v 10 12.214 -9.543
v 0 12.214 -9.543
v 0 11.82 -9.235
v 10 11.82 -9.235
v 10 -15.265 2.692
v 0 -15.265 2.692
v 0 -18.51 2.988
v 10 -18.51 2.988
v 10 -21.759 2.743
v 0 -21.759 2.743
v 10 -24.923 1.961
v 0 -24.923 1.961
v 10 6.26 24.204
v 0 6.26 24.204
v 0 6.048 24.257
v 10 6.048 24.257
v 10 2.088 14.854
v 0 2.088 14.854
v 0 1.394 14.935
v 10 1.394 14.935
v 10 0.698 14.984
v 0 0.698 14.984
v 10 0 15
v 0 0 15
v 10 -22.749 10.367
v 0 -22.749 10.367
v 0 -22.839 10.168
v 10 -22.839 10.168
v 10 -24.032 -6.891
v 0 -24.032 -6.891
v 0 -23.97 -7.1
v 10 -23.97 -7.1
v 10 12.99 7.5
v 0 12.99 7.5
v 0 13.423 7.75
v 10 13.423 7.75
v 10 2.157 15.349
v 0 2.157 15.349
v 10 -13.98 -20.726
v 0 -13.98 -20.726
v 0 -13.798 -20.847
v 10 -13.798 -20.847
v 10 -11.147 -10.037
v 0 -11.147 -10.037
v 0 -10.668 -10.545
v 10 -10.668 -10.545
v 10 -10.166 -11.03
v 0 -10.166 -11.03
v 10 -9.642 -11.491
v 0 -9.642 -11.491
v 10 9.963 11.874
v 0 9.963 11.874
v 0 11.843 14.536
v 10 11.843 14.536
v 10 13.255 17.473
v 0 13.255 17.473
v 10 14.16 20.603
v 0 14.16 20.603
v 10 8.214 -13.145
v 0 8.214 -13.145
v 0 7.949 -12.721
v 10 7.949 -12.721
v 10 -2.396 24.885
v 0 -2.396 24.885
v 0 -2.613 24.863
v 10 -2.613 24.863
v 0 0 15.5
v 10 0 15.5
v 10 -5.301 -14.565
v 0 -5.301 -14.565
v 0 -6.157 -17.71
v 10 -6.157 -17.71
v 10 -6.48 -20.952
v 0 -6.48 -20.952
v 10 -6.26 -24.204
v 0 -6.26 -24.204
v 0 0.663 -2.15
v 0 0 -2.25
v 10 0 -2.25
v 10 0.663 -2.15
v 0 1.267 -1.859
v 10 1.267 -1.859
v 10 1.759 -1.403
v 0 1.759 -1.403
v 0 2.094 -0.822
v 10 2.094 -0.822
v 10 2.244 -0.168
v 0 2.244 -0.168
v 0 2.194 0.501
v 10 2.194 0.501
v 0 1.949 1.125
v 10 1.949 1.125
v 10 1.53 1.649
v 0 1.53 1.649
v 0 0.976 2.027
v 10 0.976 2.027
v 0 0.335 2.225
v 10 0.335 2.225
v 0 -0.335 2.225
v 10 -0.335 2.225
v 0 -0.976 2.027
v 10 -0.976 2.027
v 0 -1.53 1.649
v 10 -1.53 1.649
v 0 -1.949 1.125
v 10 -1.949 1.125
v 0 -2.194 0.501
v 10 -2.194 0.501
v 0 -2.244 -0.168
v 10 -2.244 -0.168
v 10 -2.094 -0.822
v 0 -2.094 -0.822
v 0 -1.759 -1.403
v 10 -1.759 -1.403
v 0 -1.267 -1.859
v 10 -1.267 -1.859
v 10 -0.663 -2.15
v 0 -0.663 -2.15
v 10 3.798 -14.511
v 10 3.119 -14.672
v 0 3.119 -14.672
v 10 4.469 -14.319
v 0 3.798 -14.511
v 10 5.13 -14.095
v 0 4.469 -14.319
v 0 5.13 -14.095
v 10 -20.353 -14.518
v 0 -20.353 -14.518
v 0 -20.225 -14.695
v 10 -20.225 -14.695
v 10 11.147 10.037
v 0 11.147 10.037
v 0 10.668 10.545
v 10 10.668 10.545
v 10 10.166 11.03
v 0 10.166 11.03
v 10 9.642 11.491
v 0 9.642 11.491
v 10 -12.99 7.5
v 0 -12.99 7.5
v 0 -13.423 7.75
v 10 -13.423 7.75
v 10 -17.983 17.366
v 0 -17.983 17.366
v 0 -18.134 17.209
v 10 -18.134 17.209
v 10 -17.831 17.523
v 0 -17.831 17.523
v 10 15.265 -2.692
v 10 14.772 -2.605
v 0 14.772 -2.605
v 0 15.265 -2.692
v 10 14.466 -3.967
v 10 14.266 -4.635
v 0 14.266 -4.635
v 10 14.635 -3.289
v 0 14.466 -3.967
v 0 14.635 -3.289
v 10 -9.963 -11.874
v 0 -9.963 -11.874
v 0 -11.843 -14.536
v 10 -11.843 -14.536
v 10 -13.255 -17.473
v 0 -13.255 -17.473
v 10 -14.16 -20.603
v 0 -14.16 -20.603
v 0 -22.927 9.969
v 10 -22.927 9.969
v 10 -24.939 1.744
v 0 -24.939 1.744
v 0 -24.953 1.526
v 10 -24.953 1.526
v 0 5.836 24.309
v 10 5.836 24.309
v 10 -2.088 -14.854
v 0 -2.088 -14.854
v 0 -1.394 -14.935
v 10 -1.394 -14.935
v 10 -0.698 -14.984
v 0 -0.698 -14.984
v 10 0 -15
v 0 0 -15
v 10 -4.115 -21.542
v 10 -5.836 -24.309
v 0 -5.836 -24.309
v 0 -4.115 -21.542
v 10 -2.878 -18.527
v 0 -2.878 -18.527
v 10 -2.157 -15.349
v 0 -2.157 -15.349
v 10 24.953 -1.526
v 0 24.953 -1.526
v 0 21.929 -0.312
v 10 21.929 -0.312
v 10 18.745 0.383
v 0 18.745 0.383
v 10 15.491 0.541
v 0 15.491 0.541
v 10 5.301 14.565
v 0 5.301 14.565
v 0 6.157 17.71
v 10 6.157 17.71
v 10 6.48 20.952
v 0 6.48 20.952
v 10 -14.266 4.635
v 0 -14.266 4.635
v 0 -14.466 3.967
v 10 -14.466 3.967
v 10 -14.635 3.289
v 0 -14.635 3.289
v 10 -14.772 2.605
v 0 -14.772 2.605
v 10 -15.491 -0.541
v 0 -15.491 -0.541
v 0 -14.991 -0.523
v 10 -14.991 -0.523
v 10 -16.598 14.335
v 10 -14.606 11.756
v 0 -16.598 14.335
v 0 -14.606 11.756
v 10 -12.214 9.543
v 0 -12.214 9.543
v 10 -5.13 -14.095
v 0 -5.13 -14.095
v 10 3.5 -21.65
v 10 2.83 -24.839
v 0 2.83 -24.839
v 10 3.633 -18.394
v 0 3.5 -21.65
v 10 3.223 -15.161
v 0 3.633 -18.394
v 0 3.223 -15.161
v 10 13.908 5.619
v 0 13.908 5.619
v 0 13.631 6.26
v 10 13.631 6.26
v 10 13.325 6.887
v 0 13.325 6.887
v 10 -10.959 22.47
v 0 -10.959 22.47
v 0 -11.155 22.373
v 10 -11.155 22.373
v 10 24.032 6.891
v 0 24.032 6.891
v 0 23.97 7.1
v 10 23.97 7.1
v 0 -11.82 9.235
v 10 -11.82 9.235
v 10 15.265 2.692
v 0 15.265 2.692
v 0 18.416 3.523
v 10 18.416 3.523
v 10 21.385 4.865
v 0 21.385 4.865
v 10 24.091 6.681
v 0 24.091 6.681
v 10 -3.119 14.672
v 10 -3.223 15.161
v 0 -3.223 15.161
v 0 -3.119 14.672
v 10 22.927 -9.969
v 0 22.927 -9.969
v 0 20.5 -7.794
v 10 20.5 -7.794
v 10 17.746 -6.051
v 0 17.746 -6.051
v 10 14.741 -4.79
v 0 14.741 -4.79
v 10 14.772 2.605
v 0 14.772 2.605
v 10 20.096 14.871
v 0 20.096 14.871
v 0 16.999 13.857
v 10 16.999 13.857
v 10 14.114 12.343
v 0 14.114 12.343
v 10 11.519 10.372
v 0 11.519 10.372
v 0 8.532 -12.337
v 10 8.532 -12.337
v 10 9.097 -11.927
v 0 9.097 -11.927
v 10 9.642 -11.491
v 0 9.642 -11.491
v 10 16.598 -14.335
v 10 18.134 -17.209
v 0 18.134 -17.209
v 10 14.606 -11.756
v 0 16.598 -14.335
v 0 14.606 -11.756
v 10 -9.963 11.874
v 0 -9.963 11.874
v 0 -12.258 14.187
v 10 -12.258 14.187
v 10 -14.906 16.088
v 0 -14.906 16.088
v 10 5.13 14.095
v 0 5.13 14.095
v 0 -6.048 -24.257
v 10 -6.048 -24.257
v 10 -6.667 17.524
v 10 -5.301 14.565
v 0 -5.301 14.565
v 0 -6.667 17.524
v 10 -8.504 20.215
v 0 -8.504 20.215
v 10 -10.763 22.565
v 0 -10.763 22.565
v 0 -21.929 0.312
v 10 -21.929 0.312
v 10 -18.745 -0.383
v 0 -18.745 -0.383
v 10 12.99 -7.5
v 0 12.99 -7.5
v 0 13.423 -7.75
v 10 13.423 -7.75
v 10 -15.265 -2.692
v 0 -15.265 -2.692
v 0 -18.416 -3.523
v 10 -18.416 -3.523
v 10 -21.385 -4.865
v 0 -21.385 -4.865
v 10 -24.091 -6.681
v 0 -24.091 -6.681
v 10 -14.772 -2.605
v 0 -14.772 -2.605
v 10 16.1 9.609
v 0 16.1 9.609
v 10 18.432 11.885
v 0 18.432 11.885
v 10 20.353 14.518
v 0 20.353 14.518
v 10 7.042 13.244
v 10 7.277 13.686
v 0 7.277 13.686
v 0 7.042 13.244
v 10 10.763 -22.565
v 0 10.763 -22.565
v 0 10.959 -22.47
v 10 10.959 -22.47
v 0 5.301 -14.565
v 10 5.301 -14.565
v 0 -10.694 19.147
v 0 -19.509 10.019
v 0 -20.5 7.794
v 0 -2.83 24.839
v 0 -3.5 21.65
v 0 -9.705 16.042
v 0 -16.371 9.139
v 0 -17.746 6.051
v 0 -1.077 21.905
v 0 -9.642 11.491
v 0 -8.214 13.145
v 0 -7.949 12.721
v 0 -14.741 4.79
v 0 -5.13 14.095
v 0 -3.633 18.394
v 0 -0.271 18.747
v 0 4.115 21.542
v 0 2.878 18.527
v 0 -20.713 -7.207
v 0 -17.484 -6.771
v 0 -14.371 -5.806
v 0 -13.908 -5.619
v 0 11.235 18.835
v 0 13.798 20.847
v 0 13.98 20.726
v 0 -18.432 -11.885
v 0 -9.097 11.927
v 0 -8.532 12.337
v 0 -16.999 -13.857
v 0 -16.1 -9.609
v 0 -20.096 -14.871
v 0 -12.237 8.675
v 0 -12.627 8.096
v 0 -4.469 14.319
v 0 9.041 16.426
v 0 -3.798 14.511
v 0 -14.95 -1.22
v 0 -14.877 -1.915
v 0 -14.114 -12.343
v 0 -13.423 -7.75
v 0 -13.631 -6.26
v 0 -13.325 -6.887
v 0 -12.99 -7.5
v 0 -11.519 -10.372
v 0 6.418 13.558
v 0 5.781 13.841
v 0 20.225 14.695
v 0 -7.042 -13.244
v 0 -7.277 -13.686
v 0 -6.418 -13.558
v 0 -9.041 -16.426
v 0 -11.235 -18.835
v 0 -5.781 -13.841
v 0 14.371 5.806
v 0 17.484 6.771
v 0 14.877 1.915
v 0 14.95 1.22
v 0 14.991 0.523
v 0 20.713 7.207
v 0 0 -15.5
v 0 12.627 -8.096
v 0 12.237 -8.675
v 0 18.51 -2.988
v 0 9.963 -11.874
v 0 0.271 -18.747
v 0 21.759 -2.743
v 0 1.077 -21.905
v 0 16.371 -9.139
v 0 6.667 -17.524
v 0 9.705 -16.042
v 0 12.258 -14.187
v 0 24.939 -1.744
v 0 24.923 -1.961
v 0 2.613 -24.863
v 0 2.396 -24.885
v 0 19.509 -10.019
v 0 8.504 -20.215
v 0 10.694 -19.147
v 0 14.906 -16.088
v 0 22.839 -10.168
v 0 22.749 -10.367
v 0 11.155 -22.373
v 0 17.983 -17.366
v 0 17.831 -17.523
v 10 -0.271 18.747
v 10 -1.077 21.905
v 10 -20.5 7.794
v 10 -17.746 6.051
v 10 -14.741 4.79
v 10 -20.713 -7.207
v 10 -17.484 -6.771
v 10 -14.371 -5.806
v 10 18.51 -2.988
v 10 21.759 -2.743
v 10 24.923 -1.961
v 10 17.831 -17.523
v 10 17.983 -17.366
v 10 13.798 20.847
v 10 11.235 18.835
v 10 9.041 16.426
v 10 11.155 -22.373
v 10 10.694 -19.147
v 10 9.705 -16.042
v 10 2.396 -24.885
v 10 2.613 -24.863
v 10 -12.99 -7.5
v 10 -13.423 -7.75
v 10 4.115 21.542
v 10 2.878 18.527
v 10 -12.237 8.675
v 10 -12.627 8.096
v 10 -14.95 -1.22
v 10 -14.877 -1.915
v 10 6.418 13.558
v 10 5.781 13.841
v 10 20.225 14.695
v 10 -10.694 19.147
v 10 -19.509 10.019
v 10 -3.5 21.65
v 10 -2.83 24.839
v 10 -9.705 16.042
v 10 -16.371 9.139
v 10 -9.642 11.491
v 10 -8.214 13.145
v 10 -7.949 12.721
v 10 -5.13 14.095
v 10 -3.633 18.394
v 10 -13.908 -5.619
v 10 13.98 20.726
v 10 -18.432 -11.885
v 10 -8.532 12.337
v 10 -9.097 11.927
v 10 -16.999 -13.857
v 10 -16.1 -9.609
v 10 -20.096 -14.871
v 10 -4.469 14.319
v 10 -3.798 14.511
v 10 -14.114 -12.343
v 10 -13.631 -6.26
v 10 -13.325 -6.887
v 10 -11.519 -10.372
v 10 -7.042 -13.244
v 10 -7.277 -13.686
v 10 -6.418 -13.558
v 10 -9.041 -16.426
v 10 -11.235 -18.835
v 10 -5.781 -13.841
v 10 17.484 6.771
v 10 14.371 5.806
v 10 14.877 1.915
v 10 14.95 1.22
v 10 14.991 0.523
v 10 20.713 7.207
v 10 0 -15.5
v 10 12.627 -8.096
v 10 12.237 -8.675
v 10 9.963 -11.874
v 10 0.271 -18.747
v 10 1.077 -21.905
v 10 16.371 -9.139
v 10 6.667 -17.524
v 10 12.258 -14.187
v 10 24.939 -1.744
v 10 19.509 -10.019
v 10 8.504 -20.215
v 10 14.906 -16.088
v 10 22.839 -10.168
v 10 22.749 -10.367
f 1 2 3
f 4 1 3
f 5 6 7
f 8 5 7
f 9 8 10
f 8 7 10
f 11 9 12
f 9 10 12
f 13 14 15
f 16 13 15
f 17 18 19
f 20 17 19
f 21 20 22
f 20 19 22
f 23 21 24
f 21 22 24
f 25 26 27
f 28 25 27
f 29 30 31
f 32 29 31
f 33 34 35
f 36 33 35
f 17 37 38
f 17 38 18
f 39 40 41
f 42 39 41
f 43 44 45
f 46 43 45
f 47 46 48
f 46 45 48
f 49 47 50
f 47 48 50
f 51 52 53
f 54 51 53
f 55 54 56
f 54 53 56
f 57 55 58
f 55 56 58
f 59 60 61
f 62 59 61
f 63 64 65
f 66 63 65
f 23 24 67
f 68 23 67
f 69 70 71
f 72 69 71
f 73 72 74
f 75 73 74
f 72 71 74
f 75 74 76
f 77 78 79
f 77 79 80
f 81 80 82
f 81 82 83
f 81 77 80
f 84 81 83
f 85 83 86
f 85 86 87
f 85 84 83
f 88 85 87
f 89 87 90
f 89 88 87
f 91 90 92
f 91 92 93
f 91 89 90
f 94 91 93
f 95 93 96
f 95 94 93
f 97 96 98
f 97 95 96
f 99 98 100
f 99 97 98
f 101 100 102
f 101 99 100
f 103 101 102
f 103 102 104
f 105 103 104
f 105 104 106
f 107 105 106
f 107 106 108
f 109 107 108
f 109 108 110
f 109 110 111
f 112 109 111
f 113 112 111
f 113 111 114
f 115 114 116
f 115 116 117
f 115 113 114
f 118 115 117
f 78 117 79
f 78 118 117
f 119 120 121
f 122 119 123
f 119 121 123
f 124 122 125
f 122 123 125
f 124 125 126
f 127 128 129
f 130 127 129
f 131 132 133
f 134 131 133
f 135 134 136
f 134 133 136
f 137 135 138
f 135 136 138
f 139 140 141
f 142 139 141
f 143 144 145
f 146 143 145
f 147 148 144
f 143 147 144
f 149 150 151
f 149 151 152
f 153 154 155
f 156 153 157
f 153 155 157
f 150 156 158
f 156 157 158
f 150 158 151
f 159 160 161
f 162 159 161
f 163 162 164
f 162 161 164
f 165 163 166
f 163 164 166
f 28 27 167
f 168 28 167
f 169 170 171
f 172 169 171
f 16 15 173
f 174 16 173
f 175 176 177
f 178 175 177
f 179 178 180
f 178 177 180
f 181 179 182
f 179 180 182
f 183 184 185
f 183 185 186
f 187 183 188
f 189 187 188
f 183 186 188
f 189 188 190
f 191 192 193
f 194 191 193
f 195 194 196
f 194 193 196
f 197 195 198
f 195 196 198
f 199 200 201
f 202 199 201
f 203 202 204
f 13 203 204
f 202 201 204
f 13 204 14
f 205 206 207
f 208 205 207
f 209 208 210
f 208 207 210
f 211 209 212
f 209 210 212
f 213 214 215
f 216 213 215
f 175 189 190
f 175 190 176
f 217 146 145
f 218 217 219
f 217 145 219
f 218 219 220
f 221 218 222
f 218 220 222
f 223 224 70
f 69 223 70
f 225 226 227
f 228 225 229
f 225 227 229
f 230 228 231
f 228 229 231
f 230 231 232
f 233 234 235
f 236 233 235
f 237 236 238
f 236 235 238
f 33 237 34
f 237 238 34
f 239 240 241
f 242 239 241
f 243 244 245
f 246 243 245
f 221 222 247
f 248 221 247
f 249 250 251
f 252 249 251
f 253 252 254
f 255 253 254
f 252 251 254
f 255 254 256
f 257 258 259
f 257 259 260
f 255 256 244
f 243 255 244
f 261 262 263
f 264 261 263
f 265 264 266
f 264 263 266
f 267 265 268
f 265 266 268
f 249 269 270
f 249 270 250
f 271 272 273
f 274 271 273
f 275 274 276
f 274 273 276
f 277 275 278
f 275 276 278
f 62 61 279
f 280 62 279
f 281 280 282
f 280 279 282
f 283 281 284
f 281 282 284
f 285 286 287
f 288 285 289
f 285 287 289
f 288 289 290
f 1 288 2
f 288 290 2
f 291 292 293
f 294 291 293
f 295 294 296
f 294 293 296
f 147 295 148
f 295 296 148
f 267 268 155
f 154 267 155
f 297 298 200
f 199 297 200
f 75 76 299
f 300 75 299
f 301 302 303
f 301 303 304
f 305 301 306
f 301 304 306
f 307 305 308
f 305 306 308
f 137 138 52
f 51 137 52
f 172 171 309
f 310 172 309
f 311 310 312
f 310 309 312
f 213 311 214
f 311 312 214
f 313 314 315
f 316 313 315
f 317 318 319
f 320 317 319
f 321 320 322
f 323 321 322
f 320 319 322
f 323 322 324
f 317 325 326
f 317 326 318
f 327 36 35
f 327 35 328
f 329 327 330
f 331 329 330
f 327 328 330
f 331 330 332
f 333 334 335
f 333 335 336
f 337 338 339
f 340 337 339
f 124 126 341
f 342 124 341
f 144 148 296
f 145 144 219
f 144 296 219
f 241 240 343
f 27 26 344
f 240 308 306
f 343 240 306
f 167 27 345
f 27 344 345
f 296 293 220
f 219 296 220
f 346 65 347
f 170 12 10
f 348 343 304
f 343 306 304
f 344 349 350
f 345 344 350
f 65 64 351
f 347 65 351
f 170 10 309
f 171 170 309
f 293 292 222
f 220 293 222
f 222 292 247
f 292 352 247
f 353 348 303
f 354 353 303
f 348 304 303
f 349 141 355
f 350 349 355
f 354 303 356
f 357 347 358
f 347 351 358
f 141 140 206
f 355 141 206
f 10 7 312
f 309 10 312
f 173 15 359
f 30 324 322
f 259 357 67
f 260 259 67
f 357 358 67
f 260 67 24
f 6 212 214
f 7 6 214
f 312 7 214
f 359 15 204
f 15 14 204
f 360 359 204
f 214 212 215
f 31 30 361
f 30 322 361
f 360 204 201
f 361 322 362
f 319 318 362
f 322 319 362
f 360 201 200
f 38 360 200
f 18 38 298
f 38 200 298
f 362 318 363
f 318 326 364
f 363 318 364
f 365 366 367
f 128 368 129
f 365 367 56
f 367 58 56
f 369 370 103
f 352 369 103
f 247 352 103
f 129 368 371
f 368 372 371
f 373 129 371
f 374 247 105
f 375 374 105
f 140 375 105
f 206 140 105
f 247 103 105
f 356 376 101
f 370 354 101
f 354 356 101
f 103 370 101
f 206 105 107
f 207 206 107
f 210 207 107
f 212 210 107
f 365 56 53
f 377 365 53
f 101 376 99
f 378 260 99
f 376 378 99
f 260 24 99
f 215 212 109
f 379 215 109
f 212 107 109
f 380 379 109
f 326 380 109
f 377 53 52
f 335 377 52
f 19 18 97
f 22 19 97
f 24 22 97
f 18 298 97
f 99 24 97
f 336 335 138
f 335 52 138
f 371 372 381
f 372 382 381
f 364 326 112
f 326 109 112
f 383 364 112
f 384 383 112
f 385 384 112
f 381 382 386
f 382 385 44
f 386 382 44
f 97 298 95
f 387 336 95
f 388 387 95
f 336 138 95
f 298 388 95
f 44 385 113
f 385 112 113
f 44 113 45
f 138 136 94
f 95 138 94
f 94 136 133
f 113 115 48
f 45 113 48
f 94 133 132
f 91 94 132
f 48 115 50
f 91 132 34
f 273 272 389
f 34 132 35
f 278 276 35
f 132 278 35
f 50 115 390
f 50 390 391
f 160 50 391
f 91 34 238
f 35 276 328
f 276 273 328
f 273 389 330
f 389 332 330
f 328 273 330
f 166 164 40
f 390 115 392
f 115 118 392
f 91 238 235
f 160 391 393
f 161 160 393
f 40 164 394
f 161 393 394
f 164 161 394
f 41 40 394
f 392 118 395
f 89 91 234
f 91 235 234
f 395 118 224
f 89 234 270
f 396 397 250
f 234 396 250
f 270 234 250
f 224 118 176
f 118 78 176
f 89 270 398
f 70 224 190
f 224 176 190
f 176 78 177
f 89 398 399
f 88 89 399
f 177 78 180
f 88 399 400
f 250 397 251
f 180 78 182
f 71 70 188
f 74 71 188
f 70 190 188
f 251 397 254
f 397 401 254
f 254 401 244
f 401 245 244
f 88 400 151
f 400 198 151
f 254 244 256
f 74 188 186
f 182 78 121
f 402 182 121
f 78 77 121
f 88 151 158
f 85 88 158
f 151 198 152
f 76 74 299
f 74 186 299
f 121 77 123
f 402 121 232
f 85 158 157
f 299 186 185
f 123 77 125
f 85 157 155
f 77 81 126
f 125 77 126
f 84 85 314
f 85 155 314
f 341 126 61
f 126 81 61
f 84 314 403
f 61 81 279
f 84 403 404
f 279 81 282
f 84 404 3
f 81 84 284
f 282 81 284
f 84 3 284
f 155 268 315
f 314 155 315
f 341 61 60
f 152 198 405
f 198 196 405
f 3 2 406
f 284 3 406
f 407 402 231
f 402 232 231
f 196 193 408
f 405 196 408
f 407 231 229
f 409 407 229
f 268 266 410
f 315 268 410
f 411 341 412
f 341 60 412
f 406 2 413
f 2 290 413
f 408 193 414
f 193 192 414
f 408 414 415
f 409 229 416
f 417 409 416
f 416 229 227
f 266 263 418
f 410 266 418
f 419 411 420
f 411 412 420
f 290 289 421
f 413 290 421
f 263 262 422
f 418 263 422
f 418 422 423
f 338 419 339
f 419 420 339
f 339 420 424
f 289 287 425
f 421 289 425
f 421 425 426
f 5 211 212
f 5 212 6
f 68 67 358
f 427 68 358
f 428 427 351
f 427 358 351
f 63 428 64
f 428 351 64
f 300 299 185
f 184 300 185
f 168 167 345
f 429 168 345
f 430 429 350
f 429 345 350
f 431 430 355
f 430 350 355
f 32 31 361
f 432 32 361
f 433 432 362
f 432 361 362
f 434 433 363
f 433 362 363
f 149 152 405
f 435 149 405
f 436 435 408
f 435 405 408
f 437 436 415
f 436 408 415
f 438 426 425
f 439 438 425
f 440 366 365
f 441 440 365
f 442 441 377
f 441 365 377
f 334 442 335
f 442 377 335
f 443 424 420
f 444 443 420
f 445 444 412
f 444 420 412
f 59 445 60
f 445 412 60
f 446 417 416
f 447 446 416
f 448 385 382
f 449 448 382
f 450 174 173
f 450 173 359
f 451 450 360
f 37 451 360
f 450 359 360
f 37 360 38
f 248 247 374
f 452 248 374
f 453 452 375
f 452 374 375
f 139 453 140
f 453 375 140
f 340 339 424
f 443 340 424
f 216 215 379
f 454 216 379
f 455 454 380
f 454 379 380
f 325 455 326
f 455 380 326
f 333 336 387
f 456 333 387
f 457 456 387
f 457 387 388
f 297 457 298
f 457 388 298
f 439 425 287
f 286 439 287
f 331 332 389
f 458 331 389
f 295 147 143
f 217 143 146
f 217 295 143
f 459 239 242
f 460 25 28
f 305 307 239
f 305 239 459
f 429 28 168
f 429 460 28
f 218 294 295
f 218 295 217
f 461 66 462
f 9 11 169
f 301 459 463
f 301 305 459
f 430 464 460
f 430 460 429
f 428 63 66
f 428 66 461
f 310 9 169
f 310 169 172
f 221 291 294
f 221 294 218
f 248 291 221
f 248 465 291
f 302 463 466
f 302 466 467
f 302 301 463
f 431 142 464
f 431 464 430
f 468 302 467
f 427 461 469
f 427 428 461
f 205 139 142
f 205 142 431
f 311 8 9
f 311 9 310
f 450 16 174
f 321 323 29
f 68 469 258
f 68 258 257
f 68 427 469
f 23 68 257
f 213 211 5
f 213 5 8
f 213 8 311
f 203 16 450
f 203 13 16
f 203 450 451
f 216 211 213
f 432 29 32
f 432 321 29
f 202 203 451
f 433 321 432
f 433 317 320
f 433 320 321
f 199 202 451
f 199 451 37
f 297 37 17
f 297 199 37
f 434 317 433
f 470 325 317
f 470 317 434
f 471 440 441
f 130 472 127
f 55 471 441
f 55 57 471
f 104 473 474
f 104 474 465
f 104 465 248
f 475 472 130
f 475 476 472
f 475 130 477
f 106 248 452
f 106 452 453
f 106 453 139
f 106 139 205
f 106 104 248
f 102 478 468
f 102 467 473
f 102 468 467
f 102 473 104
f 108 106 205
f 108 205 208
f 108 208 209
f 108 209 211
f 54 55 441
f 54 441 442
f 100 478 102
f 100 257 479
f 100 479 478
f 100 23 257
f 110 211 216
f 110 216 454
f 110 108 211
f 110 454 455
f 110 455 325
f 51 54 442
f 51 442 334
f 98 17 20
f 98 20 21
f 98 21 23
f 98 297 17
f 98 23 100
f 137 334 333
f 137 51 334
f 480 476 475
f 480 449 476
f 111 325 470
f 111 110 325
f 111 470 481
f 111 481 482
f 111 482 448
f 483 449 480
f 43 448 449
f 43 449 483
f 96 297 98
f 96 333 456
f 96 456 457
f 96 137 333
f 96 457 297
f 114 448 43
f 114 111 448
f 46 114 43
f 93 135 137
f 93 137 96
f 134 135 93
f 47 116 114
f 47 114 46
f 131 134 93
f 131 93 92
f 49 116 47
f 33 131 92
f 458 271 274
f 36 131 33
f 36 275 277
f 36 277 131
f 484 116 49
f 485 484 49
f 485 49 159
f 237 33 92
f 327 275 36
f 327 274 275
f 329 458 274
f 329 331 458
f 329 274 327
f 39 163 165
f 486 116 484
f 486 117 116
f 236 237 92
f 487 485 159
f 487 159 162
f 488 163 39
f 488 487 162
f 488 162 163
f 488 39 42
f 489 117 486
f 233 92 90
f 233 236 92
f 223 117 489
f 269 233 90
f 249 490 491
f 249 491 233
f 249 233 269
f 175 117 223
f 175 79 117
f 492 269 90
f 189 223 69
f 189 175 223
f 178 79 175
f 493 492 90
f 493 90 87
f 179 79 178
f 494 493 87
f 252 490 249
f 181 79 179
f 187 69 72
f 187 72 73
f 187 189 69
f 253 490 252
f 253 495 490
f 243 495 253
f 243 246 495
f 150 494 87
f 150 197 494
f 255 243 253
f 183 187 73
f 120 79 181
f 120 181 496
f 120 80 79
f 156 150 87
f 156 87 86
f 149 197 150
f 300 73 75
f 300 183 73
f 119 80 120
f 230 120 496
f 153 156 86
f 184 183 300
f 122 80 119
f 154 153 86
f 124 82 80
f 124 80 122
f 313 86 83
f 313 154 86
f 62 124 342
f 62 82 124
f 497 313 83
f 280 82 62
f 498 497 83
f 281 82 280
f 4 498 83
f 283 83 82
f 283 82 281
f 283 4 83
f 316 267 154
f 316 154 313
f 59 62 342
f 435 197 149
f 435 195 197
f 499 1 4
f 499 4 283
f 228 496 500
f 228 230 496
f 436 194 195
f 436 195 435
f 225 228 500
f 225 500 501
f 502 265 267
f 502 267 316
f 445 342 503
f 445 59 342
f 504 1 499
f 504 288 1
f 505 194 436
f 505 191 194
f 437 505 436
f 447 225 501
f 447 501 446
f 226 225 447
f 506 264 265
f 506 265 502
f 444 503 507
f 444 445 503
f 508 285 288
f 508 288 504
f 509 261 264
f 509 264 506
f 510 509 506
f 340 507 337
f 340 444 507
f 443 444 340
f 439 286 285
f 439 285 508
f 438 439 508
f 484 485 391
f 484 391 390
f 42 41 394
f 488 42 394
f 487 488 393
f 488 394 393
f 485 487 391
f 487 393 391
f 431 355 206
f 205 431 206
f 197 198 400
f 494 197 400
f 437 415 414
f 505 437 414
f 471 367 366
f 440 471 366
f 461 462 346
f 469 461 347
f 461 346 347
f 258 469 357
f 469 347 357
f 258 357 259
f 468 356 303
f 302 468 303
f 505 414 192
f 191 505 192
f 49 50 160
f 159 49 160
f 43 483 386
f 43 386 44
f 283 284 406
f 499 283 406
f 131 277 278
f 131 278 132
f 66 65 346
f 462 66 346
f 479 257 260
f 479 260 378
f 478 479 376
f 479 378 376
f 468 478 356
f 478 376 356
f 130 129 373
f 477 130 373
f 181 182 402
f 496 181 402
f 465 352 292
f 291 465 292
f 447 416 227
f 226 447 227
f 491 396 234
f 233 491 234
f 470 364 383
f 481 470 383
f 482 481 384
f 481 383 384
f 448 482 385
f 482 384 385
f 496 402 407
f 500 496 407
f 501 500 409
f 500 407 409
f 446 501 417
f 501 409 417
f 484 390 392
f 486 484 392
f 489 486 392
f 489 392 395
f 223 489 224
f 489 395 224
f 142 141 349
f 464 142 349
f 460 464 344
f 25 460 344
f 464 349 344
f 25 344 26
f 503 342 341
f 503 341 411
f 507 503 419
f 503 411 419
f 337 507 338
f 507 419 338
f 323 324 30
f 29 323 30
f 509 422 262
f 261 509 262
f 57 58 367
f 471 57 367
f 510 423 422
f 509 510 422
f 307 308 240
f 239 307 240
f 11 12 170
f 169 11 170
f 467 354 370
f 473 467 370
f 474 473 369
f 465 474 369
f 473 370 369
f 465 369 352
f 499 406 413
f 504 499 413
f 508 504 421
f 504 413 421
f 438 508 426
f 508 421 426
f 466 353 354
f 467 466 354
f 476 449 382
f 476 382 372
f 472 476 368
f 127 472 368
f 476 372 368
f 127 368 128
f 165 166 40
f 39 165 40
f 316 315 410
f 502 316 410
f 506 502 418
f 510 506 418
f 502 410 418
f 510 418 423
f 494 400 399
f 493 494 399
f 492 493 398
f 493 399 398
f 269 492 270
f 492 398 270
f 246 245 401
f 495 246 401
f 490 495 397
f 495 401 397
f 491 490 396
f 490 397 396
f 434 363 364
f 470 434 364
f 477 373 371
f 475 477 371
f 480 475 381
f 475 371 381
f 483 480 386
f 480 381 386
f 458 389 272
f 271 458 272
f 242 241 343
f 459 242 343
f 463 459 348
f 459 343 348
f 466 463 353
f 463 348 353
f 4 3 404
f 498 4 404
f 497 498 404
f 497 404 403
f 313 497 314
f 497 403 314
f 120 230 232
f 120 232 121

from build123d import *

# Parameters (mm, degrees)
SKETCH1_R           = 15
SKETCH1_R_2         = 2.25
BOSS_EXTRUDE2_DEPTH = 10


with BuildPart() as part:
    # Sketch1 → Boss-Extrude2 (new body)
    with BuildSketch(Plane(origin=(0, 0, 0), x_dir=(0, 0, -1), z_dir=(1, 0, 0))):
        with BuildLine():
            ThreePointArc((12.720721442, 7.948788963), (13.481910694, 6.575567202), (14.095389312, 5.13030215))
            Line((14.095389312, 5.13030215), (14.565235622, 5.301312222))
            ThreePointArc((14.565235622, 5.301312222), (18.908034497, 7.529506054), (22.564632109, 10.76277742))
            Line((22.564632109, 10.76277742), (22.469851157, 10.95927867))
            Line((22.469851157, 10.95927867), (22.37335904, 11.154945328))
            ThreePointArc((22.37335904, 11.154945328), (17.574280154, 10.264107707), (13.14474549, 8.213748596))
            Line((13.14474549, 8.213748596), (12.720721442, 7.948788963))
        make_face()
        with BuildLine():
            ThreePointArc((9.23492213, 11.820161304), (10.419875557, 10.790097005), (11.490666647, 9.641814145))
            Line((11.490666647, 9.641814145), (11.873688868, 9.96320795))
            ThreePointArc((11.873688868, 9.96320795), (15.19249775, 13.542349946), (17.522731607, 17.831261229))
            Line((17.522731607, 17.831261229), (17.366459261, 17.983495008))
            Line((17.366459261, 17.983495008), (17.208864392, 18.134359275))
            ThreePointArc((17.208864392, 18.134359275), (13.003889787, 15.655864088), (9.542752868, 12.214166681))
            Line((9.542752868, 12.214166681), (9.23492213, 11.820161304))
        make_face()
        with BuildLine():
            ThreePointArc((4.635254916, 14.265847744), (6.101049646, 13.703181865), (7.5, 12.990381057))
            Line((7.5, 12.990381057), (7.75, 13.423393759))
            ThreePointArc((7.75, 13.423393759), (9.644521558, 17.92178657), (10.367331066, 22.749031772))
            Line((10.367331066, 22.749031772), (10.168416077, 22.838636441))
            Line((10.168416077, 22.838636441), (9.968726723, 22.92650186))
            ThreePointArc((9.968726723, 22.92650186), (6.865038395, 19.159292205), (4.789763413, 14.741376003))
            Line((4.789763413, 14.741376003), (4.635254916, 14.265847744))
        make_face()
        with BuildLine():
            ThreePointArc((-0.523492451, 14.990862405), (1.046347106, 14.963460754), (2.604722665, 14.772116295))
            Line((2.604722665, 14.772116295), (2.691546754, 15.264520172))
            ThreePointArc((2.691546754, 15.264520172), (2.933273727, 20.139591237), (1.961477393, 24.922933343))
            Line((1.961477393, 24.922933343), (1.743911844, 24.939101256))
            Line((1.743911844, 24.939101256), (1.526213488, 24.953369961))
            ThreePointArc((1.526213488, 24.953369961), (-0.101837945, 20.35182692), (-0.540942199, 15.490557819))
            Line((-0.540942199, 15.490557819), (-0.523492451, 14.990862405))
        make_face()
        with BuildLine():
            ThreePointArc((-5.619098901, 13.907757819), (-4.134560337, 14.418925439), (-2.604722665, 14.772116295))
            Line((-2.604722665, 14.772116295), (-2.691546754, 15.264520172))
            ThreePointArc((-2.691546754, 15.264520172), (-4.131770205, 19.928263972), (-6.680959402, 24.09076133))
            Line((-6.680959402, 24.09076133), (-6.890933895, 24.031542398))
            Line((-6.890933895, 24.031542398), (-7.100383618, 23.970493372))
            ThreePointArc((-7.100383618, 23.970493372), (-7.056431125, 19.089630948), (-5.806402198, 14.371349746))
            Line((-5.806402198, 14.371349746), (-5.619098901, 13.907757819))
        make_face()
        with BuildLine():
            ThreePointArc((-10.036959095, 11.147172382), (-8.816778784, 12.135254916), (-7.5, 12.990381057))
            Line((-7.5, 12.990381057), (-7.75, 13.423393759))
            ThreePointArc((-7.75, 13.423393759), (-10.698461672, 17.313293962), (-14.517573893, 20.352887959))
            Line((-14.517573893, 20.352887959), (-14.694631307, 20.225424859))
            Line((-14.694631307, 20.225424859), (-14.870569669, 20.096421515))
            ThreePointArc((-14.870569669, 20.096421515), (-13.15991457, 15.524943751), (-10.371524399, 11.518744795))
            Line((-10.371524399, 11.518744795), (-10.036959095, 11.147172382))
        make_face()
        with BuildLine():
            ThreePointArc((-13.244213893, 7.042073442), (-12.435563588, 8.387893552), (-11.490666647, 9.641814145))
            Line((-11.490666647, 9.641814145), (-11.873688868, 9.96320795))
            ThreePointArc((-11.873688868, 9.96320795), (-15.974760769, 12.610085183), (-20.603154716, 14.160155923))
            Line((-20.603154716, 14.160155923), (-20.725939314, 13.979822587))
            Line((-20.725939314, 13.979822587), (-20.847145552, 13.798424633))
            ThreePointArc((-20.847145552, 13.798424633), (-17.676118098, 10.087719213), (-13.685687689, 7.276809223))
            Line((-13.685687689, 7.276809223), (-13.244213893, 7.042073442))
        make_face()
        with BuildLine():
            ThreePointArc((-14.854021031, 2.087596514), (-14.554435894, 3.628828434), (-14.095389312, 5.13030215))
            Line((-14.095389312, 5.13030215), (-14.565235622, 5.301312222))
            ThreePointArc((-14.565235622, 5.301312222), (-19.324267955, 6.385914026), (-24.203691009, 6.259500101))
            Line((-24.203691009, 6.259500101), (-24.257393157, 6.04804739))
            Line((-24.257393157, 6.04804739), (-24.30924801, 5.836134096))
            ThreePointArc((-24.30924801, 5.836134096), (-20.060320912, 3.43376686), (-15.349155065, 2.157183065))
            Line((-15.349155065, 2.157183065), (-14.854021031, 2.087596514))
        make_face()
        with BuildLine():
            Line((-15.161287811, -3.222631208), (-14.672214011, -3.118675362))
            ThreePointArc((-14.672214011, -3.118675362), (-14.917828431, -1.567926949), (-15, 0))
            Line((-15, 0), (-15.5, 0))
            ThreePointArc((-15.5, 0), (-20.34298323, -0.608492609), (-24.884904959, -2.396143813))
            Line((-24.884904959, -2.396143813), (-24.863047384, -2.613211582))
            Line((-24.863047384, -2.613211582), (-24.839296392, -2.830080344))
            ThreePointArc((-24.839296392, -2.830080344), (-20.024952965, -3.634348454), (-15.161287811, -3.222631208))
        make_face()
        with BuildLine():
            Line((-13.14474549, -8.213748596), (-12.720721442, -7.948788963))
            ThreePointArc((-12.720721442, -7.948788963), (-13.481910694, -6.575567202), (-14.095389312, -5.13030215))
            Line((-14.095389312, -5.13030215), (-14.565235622, -5.301312222))
            ThreePointArc((-14.565235622, -5.301312222), (-18.908034497, -7.529506054), (-22.564632109, -10.76277742))
            Line((-22.564632109, -10.76277742), (-22.469851157, -10.95927867))
            Line((-22.469851157, -10.95927867), (-22.37335904, -11.154945328))
            ThreePointArc((-22.37335904, -11.154945328), (-17.574280154, -10.264107707), (-13.14474549, -8.213748596))
        make_face()
        with BuildLine():
            Line((-9.542752868, -12.214166681), (-9.23492213, -11.820161304))
            ThreePointArc((-9.23492213, -11.820161304), (-10.419875557, -10.790097005), (-11.490666647, -9.641814145))
            Line((-11.490666647, -9.641814145), (-11.873688868, -9.96320795))
            ThreePointArc((-11.873688868, -9.96320795), (-15.19249775, -13.542349946), (-17.522731607, -17.831261229))
            Line((-17.522731607, -17.831261229), (-17.366459261, -17.983495008))
            Line((-17.366459261, -17.983495008), (-17.208864392, -18.134359275))
            ThreePointArc((-17.208864392, -18.134359275), (-13.003889787, -15.655864088), (-9.542752868, -12.214166681))
        make_face()
        with BuildLine():
            Line((-4.789763413, -14.741376003), (-4.635254916, -14.265847744))
            ThreePointArc((-4.635254916, -14.265847744), (-6.101049646, -13.703181865), (-7.5, -12.990381057))
            Line((-7.5, -12.990381057), (-7.75, -13.423393759))
            ThreePointArc((-7.75, -13.423393759), (-9.644521558, -17.92178657), (-10.367331066, -22.749031772))
            Line((-10.367331066, -22.749031772), (-10.168416077, -22.838636441))
            Line((-10.168416077, -22.838636441), (-9.968726723, -22.92650186))
            ThreePointArc((-9.968726723, -22.92650186), (-6.865038395, -19.159292205), (-4.789763413, -14.741376003))
        make_face()
        with BuildLine():
            Line((0.540942199, -15.490557819), (0.523492451, -14.990862405))
            ThreePointArc((0.523492451, -14.990862405), (-1.046347106, -14.963460754), (-2.604722665, -14.772116295))
            Line((-2.604722665, -14.772116295), (-2.691546754, -15.264520172))
            ThreePointArc((-2.691546754, -15.264520172), (-2.933273727, -20.139591237), (-1.961477393, -24.922933343))
            Line((-1.961477393, -24.922933343), (-1.743911844, -24.939101256))
            Line((-1.743911844, -24.939101256), (-1.526213488, -24.953369961))
            ThreePointArc((-1.526213488, -24.953369961), (0.101837945, -20.35182692), (0.540942199, -15.490557819))
        make_face()
        with BuildLine():
            Line((5.806402198, -14.371349746), (5.619098901, -13.907757819))
            ThreePointArc((5.619098901, -13.907757819), (4.134560337, -14.418925439), (2.604722665, -14.772116295))
            Line((2.604722665, -14.772116295), (2.691546754, -15.264520172))
            ThreePointArc((2.691546754, -15.264520172), (4.131770205, -19.928263972), (6.680959402, -24.09076133))
            Line((6.680959402, -24.09076133), (6.890933895, -24.031542398))
            Line((6.890933895, -24.031542398), (7.100383618, -23.970493372))
            ThreePointArc((7.100383618, -23.970493372), (7.056431125, -19.089630948), (5.806402198, -14.371349746))
        make_face()
        with BuildLine():
            Line((10.371524399, -11.518744795), (10.036959095, -11.147172382))
            ThreePointArc((10.036959095, -11.147172382), (8.816778784, -12.135254916), (7.5, -12.990381057))
            Line((7.5, -12.990381057), (7.75, -13.423393759))
            ThreePointArc((7.75, -13.423393759), (10.698461672, -17.313293962), (14.517573893, -20.352887959))
            Line((14.517573893, -20.352887959), (14.694631307, -20.225424859))
            Line((14.694631307, -20.225424859), (14.870569669, -20.096421515))
            ThreePointArc((14.870569669, -20.096421515), (13.15991457, -15.524943751), (10.371524399, -11.518744795))
        make_face()
        with BuildLine():
            Line((13.685687689, -7.276809223), (13.244213893, -7.042073442))
            ThreePointArc((13.244213893, -7.042073442), (12.435563588, -8.387893552), (11.490666647, -9.641814145))
            Line((11.490666647, -9.641814145), (11.873688868, -9.96320795))
            ThreePointArc((11.873688868, -9.96320795), (15.974760769, -12.610085183), (20.603154716, -14.160155923))
            Line((20.603154716, -14.160155923), (20.725939314, -13.979822587))
            Line((20.725939314, -13.979822587), (20.847145552, -13.798424633))
            ThreePointArc((20.847145552, -13.798424633), (17.676118098, -10.087719213), (13.685687689, -7.276809223))
        make_face()
        with BuildLine():
            Line((15.349155065, -2.157183065), (14.854021031, -2.087596514))
            ThreePointArc((14.854021031, -2.087596514), (14.554435894, -3.628828434), (14.095389312, -5.13030215))
            Line((14.095389312, -5.13030215), (14.565235622, -5.301312222))
            ThreePointArc((14.565235622, -5.301312222), (19.324267955, -6.385914026), (24.203691009, -6.259500101))
            Line((24.203691009, -6.259500101), (24.257393157, -6.04804739))
            Line((24.257393157, -6.04804739), (24.30924801, -5.836134096))
            ThreePointArc((24.30924801, -5.836134096), (20.060320912, -3.43376686), (15.349155065, -2.157183065))
        make_face()
        with BuildLine():
            ThreePointArc((14.672214011, 3.118675362), (14.917828431, 1.567926949), (15, 0))
            Line((15, 0), (15.5, 0))
            ThreePointArc((15.5, 0), (20.34298323, 0.608492609), (24.884904959, 2.396143813))
            Line((24.884904959, 2.396143813), (24.863047384, 2.613211582))
            Line((24.863047384, 2.613211582), (24.839296392, 2.830080344))
            ThreePointArc((24.839296392, 2.830080344), (20.024952965, 3.634348454), (15.161287811, 3.222631208))
            Line((15.161287811, 3.222631208), (14.672214011, 3.118675362))
        make_face()
        Circle(SKETCH1_R)
        Circle(SKETCH1_R_2, mode=Mode.SUBTRACT)
    extrude(amount=BOSS_EXTRUDE2_DEPTH)


solid = part.part
